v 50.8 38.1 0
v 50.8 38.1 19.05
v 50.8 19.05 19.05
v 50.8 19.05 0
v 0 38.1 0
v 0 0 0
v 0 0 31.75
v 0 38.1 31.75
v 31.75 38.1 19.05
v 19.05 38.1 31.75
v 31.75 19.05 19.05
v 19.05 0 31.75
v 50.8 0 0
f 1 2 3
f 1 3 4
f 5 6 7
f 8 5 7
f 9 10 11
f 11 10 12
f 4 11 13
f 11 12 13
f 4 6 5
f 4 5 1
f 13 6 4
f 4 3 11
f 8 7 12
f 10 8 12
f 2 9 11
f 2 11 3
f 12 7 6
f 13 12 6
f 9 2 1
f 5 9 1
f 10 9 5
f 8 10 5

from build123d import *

# Parameters (mm, degrees)
F0_W     = 50.8
F0_H     = 31.75
F1_DEPTH = 38.1
F3_DEPTH = 38.1
F5_DEPTH = 19.05


with BuildPart() as f1:
    # F0 (on Front) → F1 (new body)
    with BuildSketch(Plane.XZ):
        with Locations((25.4, 15.875)):
            Rectangle(F0_W, F0_H)
    extrude(amount=-F1_DEPTH)

    # F2 (on face) → F3 (cut)
    with BuildSketch(Plane.XZ):
        Polygon((19.05, 31.75), (50.8, 0), (50.8, 31.75), align=None)
    extrude(amount=-F3_DEPTH, mode=Mode.SUBTRACT)

    # F4 (on face) → F5 (join)
    with BuildSketch(Plane(origin=(0, 38.1, 0), x_dir=(-1, 0, 0), z_dir=(0, 1, 0))):
        Polygon((-50.8, 19.05), (-50.8, 0), (-31.75, 19.05), align=None)
    extrude(amount=-F5_DEPTH)


solid = f1.part
